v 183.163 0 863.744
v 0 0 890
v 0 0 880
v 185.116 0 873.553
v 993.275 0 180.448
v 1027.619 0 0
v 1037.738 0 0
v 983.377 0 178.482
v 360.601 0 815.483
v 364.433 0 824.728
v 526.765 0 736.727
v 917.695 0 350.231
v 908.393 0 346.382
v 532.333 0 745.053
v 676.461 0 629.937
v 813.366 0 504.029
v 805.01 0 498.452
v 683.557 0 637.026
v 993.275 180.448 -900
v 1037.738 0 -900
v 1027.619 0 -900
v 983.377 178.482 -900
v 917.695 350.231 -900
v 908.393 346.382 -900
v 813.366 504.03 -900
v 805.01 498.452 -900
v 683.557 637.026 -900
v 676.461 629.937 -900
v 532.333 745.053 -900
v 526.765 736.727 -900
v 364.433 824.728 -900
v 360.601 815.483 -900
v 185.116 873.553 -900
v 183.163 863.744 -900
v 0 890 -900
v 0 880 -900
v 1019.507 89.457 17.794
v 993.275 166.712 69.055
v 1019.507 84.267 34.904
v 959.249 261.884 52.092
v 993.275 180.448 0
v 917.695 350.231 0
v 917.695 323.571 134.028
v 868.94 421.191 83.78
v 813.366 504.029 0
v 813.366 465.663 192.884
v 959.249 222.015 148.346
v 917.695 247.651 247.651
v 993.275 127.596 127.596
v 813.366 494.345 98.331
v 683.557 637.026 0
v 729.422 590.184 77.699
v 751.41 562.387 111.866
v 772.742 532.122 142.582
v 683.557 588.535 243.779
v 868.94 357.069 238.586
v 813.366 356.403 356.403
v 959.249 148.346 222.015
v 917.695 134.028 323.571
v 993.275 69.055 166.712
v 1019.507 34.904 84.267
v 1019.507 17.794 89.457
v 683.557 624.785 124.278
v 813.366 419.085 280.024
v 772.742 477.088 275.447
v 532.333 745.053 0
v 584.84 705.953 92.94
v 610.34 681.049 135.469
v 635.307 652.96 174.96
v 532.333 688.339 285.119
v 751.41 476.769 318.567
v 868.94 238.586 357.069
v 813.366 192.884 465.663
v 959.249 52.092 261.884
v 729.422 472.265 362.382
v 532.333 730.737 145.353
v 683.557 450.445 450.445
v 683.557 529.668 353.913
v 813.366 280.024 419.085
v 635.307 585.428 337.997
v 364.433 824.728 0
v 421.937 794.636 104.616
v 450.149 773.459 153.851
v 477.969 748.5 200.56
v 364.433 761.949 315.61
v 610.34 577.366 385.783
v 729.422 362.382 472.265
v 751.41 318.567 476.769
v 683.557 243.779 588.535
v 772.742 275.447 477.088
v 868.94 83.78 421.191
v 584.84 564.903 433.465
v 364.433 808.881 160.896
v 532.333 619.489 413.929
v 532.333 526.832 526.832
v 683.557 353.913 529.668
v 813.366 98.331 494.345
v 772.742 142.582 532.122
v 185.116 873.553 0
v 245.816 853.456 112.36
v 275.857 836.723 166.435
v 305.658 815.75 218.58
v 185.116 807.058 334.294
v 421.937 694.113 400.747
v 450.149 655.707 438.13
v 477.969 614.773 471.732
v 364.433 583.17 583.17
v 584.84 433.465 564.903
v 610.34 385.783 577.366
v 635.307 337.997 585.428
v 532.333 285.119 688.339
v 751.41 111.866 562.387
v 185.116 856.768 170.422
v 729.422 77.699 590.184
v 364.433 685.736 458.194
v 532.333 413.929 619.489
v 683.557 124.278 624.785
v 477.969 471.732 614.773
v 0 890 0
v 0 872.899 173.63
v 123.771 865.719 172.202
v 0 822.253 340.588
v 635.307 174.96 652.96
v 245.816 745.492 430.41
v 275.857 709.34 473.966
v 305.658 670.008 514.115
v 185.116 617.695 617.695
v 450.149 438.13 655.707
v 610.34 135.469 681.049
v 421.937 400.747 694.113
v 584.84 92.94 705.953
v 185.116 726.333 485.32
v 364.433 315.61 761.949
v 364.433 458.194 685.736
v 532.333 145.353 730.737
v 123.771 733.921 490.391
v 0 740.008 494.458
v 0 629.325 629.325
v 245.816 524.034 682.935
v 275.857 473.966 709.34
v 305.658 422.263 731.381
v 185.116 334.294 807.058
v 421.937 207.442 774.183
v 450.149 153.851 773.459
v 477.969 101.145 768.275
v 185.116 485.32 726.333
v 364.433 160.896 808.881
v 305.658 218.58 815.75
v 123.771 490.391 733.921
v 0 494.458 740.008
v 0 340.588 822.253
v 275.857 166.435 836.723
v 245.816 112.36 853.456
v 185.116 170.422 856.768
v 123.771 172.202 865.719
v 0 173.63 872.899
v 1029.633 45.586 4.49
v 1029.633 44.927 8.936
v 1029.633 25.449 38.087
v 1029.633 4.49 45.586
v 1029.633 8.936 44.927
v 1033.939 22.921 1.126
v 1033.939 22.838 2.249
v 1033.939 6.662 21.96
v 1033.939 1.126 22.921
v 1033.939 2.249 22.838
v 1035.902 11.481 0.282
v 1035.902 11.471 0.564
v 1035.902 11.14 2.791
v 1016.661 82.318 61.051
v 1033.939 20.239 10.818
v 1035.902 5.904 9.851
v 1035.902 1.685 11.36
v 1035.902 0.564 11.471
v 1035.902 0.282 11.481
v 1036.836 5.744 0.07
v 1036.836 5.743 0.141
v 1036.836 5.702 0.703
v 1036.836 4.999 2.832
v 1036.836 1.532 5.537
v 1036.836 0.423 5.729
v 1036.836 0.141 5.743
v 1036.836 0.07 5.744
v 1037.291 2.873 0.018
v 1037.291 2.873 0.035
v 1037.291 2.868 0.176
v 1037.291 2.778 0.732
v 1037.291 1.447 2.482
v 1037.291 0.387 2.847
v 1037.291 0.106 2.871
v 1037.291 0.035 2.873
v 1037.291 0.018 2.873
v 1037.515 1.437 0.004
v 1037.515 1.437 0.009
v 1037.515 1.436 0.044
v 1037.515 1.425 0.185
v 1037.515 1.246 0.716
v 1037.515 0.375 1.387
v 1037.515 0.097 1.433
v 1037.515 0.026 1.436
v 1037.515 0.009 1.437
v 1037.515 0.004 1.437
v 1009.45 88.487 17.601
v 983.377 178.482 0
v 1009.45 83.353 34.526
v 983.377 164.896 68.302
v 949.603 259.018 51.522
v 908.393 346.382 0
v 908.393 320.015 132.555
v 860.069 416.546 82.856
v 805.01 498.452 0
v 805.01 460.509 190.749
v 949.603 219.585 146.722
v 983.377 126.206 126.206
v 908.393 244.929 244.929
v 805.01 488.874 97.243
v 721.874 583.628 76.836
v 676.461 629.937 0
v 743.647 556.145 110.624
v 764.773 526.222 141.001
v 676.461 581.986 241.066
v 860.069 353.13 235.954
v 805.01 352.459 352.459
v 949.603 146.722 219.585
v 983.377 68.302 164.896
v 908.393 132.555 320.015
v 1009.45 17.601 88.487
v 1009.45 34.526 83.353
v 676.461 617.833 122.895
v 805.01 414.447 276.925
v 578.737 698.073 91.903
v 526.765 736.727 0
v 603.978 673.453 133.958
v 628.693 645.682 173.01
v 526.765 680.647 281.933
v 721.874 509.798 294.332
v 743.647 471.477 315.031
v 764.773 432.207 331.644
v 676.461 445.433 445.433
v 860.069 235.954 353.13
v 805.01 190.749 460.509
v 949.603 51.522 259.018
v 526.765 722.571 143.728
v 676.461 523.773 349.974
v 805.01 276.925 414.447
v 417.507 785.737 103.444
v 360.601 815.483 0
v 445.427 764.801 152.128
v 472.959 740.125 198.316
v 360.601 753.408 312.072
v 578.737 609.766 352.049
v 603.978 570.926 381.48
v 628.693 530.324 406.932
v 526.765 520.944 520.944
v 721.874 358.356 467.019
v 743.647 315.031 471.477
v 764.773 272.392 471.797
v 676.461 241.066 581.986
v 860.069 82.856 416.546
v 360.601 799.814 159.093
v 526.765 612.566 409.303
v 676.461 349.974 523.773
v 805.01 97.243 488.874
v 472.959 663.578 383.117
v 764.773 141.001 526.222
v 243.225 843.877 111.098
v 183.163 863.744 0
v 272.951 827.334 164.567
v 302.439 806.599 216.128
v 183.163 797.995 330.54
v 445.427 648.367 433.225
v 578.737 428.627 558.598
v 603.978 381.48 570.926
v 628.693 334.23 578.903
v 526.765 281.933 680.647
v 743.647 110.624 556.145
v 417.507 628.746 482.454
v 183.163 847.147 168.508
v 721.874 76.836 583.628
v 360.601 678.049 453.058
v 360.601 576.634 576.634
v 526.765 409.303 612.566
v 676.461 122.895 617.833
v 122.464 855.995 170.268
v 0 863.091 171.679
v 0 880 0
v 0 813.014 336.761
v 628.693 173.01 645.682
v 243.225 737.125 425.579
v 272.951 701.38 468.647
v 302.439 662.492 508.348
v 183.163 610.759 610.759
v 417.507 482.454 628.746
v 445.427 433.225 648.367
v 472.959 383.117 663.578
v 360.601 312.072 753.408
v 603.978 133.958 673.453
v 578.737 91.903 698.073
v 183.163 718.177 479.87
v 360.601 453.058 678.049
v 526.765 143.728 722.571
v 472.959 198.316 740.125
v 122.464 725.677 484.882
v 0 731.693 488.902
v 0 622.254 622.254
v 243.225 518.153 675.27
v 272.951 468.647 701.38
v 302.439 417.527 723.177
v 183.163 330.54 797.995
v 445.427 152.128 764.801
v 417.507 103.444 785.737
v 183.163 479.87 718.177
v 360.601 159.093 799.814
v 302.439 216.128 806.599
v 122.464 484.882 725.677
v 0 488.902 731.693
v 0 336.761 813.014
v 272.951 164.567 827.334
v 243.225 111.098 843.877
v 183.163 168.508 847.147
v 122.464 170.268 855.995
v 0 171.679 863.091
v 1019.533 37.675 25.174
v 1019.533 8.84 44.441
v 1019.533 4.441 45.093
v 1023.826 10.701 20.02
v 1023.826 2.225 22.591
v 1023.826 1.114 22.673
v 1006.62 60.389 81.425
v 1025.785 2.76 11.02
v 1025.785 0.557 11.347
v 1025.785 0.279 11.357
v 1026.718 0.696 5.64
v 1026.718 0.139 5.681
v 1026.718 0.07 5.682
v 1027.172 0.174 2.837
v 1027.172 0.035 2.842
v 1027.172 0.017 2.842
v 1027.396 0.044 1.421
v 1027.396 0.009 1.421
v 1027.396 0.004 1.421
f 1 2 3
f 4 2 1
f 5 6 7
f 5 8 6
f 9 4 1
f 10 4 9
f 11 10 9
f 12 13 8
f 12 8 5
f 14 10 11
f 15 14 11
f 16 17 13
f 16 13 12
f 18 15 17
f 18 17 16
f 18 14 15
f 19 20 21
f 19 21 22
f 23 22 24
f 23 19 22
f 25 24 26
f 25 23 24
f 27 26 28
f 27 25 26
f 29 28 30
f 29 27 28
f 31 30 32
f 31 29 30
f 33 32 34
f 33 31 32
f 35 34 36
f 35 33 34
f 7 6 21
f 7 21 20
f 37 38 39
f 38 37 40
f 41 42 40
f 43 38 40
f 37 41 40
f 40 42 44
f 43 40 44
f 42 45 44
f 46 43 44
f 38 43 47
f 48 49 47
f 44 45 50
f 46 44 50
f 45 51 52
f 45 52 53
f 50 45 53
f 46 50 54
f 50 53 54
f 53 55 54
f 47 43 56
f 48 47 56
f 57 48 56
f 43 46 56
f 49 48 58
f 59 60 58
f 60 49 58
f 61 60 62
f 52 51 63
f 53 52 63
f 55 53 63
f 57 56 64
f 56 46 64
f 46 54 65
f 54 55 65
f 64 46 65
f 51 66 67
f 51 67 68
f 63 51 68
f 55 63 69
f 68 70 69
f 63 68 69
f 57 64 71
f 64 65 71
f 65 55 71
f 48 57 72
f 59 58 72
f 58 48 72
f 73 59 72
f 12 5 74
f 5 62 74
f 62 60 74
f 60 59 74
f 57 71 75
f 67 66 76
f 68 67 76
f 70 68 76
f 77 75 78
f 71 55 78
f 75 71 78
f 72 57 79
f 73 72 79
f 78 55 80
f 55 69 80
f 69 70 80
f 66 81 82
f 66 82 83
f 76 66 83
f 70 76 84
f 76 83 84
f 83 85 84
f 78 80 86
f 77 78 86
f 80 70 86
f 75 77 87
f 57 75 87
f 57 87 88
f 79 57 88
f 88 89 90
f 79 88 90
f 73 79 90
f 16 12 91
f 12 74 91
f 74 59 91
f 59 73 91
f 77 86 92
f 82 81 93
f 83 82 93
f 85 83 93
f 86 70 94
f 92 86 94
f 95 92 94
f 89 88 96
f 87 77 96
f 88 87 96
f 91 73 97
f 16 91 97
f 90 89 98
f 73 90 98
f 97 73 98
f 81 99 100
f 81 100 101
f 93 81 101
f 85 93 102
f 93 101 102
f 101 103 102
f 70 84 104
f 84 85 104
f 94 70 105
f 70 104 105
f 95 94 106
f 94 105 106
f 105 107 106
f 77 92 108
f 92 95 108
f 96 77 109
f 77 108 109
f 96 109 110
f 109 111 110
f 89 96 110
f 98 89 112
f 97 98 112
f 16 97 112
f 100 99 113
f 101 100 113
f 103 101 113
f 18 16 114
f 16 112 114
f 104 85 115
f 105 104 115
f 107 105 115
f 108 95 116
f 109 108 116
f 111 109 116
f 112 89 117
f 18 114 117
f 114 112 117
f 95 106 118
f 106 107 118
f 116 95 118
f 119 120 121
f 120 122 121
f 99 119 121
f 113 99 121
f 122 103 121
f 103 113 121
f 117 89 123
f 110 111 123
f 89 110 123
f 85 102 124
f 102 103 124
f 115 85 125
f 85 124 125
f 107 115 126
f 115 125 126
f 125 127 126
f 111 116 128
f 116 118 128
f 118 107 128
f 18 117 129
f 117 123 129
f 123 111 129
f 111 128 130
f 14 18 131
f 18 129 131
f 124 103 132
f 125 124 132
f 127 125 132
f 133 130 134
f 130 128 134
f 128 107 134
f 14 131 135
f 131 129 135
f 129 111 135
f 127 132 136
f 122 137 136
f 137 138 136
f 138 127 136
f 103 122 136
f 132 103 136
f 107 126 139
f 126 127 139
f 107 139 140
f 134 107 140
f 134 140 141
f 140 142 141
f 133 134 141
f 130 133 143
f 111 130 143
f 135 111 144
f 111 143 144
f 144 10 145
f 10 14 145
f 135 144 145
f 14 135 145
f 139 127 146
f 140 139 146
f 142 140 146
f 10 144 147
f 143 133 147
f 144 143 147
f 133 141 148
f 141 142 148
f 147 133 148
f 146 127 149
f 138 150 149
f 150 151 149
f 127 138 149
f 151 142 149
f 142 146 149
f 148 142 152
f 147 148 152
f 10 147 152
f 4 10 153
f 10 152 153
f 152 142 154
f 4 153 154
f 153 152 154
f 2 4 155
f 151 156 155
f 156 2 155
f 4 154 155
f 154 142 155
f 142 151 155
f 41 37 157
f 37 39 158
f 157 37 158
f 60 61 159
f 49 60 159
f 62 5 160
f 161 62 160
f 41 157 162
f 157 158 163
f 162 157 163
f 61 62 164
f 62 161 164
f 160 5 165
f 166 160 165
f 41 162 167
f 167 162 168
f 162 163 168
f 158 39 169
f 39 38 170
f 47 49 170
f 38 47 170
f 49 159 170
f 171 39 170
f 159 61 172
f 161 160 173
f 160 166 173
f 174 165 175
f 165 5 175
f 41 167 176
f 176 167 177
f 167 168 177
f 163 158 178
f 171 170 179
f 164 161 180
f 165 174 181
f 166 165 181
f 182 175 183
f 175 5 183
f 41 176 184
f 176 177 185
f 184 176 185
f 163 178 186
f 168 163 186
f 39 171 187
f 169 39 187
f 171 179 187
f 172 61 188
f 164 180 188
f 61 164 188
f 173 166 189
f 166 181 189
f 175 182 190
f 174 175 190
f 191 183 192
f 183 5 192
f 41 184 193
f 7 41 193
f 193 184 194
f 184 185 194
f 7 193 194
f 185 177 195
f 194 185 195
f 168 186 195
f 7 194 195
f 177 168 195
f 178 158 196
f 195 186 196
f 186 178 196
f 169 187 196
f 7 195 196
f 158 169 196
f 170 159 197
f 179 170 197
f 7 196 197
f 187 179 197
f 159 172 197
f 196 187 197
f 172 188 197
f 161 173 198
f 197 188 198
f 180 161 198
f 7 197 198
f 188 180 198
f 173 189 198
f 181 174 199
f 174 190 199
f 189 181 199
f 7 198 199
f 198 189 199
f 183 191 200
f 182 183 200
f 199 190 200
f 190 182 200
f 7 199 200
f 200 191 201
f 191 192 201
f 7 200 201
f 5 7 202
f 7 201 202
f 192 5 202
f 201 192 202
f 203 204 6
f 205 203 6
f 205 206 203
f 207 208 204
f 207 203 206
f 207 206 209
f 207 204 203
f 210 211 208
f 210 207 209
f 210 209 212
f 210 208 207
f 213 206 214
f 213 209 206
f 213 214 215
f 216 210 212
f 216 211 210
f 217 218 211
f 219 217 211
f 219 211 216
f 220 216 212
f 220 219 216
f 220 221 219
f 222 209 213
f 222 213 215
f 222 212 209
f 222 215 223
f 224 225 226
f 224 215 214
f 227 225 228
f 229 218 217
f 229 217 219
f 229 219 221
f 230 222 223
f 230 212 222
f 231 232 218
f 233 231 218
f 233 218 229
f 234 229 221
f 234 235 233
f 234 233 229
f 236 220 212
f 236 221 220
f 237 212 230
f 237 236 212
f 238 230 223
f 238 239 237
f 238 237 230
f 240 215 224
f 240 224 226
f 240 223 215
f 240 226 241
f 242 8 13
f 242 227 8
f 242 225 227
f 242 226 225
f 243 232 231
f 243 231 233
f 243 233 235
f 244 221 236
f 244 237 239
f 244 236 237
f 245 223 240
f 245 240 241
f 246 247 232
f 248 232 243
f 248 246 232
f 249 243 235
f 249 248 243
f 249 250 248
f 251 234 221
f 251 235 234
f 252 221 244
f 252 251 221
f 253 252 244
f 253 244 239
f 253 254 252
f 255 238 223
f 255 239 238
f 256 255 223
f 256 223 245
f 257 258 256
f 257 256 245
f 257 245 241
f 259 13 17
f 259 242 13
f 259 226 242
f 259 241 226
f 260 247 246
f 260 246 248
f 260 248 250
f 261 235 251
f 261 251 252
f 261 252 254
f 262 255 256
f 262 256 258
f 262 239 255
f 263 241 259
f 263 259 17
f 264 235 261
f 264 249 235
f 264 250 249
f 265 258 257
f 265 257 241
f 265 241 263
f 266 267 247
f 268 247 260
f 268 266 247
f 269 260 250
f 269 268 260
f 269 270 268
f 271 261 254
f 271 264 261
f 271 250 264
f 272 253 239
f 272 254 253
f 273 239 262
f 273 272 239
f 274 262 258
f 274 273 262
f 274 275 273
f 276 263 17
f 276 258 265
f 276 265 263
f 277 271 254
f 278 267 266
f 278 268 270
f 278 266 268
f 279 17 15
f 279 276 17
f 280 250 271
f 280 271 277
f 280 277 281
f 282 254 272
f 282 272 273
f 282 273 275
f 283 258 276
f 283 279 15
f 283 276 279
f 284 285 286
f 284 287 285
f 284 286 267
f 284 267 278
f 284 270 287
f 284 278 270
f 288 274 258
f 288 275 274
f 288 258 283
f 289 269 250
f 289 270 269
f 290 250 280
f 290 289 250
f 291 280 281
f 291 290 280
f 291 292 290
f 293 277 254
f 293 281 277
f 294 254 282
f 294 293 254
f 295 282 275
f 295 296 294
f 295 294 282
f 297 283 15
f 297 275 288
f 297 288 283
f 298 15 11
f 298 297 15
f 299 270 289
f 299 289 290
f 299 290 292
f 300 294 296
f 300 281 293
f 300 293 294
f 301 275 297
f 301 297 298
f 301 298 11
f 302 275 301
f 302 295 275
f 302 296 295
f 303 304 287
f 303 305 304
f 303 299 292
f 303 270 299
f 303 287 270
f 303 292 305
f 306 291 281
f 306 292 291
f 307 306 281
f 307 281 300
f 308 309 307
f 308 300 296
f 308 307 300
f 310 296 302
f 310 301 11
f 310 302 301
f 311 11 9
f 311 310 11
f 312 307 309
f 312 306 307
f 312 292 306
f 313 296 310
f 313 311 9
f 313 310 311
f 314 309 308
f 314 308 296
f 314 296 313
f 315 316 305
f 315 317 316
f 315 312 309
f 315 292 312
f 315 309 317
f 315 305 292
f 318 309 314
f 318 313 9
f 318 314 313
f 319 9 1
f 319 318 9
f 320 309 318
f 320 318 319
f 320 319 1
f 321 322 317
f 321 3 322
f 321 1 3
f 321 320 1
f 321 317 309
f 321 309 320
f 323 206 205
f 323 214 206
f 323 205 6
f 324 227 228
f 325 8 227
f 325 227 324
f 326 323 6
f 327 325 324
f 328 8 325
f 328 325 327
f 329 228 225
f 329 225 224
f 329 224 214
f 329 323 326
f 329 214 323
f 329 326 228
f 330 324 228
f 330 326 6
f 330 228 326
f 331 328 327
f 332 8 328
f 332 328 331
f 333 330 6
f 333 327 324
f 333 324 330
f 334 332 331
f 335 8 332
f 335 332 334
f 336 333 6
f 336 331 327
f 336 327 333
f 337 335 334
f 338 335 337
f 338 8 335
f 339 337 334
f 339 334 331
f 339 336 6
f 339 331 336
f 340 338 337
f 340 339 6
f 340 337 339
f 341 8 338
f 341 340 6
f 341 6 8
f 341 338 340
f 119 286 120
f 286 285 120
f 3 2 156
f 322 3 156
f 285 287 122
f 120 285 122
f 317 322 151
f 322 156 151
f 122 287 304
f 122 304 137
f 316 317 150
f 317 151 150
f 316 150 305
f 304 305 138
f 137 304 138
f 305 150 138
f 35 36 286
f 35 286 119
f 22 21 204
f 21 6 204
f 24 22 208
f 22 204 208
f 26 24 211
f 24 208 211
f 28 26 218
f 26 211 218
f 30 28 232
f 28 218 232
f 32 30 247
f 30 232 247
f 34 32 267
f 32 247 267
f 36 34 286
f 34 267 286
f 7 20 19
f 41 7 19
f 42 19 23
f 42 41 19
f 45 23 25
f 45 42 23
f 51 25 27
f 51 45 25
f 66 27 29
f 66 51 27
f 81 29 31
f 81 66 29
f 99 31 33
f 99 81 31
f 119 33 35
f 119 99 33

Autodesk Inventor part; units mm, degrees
ref_plane "XZ Plane" through (0, 0, 0) normal (0, 1, 0) x (-1, 0, 0)
sketch "Sketch1" plane through (0, 0, 0) normal (0, 0, 1) x (1, 0, 0)
  arc A0 (0, 890) -> (-1037.7379, 0) centre (0, -160) ccw
  arc A1 (1037.7379, 0) -> (0, 890) centre (0, -160) ccw
  arc A2 (0, 880) -> (-1027.6186, 0) centre (0, -160) ccw
  arc A3 (1027.6186, 0) -> (0, 880) centre (0, -160) ccw
  line L0 (1027.6186, 0) -> (1037.7379, 0)
  line L1 (-1037.7379, 0) -> (-1027.6186, 0)
  point P0 (0, 0)
  dimension "d0" = 0
  dimension "d1" = 0
  dimension "d2" = 0
  dimension "d3" = 160
  dimension "d6" = 890
  dimension "d8" = 1037.7379
  dimension "d10" = 0
  dimension "d11" = 10
  dimension "d12" = 0
revolve "Revolution2" add sketch "Sketch1" angle 90 about axis through (1027.6186, 0, 0) along (1, 0, 0)
ref_plane "end1" through (-1037.7379, 0, 0) normal (1, 0, 0) x (0, 1, 0)
sketch "Sketch3" plane through (-1037.7379, 0, 0) normal (1, 0, 0) x (0, 1, 0)
  line L0 (890, 0) -> (0, 0) projected
  line L1 (0, 890) -> (0, 0) projected
  line L2 (890, 0) -> (0, 0)
  line L3 (0, 0) -> (0, 890)
  line L4 (0, 890) -> (890, 890)
  line L5 (890, 890) -> (890, 0)
extrude "Extrusion1" cut sketch "Sketch3" along normal blind 1037.7379
ref_plane "end2" through (1037.7379, 0, 0) normal (1, 0, 0) x (0, 1, 0)
sketch "Sketch4" plane through (0, -160, 0) normal (0, 0, -1) x (-0.7590721, 0.6510065, 0)
  arc A0 (683.5569, 797.0257) -> (-683.5569, 797.0257) centre (0, 0) ccw projected
  arc A1 (677.0468, 789.435) -> (-675.8756, 790.438) centre (0, 0) ccw projected
  line L0 (677.0468, 789.435) -> (683.5569, 797.0257) projected
  line L1 (-675.8756, 790.438) -> (-683.5569, 797.0257) projected
  point P0 (104.161, 121.4515)
extrude "Extrusion2" add sketch "Sketch4" along normal blind 900
equation "\"d14\" = d8"
properties part number "cover2_sule_inner_extended"
